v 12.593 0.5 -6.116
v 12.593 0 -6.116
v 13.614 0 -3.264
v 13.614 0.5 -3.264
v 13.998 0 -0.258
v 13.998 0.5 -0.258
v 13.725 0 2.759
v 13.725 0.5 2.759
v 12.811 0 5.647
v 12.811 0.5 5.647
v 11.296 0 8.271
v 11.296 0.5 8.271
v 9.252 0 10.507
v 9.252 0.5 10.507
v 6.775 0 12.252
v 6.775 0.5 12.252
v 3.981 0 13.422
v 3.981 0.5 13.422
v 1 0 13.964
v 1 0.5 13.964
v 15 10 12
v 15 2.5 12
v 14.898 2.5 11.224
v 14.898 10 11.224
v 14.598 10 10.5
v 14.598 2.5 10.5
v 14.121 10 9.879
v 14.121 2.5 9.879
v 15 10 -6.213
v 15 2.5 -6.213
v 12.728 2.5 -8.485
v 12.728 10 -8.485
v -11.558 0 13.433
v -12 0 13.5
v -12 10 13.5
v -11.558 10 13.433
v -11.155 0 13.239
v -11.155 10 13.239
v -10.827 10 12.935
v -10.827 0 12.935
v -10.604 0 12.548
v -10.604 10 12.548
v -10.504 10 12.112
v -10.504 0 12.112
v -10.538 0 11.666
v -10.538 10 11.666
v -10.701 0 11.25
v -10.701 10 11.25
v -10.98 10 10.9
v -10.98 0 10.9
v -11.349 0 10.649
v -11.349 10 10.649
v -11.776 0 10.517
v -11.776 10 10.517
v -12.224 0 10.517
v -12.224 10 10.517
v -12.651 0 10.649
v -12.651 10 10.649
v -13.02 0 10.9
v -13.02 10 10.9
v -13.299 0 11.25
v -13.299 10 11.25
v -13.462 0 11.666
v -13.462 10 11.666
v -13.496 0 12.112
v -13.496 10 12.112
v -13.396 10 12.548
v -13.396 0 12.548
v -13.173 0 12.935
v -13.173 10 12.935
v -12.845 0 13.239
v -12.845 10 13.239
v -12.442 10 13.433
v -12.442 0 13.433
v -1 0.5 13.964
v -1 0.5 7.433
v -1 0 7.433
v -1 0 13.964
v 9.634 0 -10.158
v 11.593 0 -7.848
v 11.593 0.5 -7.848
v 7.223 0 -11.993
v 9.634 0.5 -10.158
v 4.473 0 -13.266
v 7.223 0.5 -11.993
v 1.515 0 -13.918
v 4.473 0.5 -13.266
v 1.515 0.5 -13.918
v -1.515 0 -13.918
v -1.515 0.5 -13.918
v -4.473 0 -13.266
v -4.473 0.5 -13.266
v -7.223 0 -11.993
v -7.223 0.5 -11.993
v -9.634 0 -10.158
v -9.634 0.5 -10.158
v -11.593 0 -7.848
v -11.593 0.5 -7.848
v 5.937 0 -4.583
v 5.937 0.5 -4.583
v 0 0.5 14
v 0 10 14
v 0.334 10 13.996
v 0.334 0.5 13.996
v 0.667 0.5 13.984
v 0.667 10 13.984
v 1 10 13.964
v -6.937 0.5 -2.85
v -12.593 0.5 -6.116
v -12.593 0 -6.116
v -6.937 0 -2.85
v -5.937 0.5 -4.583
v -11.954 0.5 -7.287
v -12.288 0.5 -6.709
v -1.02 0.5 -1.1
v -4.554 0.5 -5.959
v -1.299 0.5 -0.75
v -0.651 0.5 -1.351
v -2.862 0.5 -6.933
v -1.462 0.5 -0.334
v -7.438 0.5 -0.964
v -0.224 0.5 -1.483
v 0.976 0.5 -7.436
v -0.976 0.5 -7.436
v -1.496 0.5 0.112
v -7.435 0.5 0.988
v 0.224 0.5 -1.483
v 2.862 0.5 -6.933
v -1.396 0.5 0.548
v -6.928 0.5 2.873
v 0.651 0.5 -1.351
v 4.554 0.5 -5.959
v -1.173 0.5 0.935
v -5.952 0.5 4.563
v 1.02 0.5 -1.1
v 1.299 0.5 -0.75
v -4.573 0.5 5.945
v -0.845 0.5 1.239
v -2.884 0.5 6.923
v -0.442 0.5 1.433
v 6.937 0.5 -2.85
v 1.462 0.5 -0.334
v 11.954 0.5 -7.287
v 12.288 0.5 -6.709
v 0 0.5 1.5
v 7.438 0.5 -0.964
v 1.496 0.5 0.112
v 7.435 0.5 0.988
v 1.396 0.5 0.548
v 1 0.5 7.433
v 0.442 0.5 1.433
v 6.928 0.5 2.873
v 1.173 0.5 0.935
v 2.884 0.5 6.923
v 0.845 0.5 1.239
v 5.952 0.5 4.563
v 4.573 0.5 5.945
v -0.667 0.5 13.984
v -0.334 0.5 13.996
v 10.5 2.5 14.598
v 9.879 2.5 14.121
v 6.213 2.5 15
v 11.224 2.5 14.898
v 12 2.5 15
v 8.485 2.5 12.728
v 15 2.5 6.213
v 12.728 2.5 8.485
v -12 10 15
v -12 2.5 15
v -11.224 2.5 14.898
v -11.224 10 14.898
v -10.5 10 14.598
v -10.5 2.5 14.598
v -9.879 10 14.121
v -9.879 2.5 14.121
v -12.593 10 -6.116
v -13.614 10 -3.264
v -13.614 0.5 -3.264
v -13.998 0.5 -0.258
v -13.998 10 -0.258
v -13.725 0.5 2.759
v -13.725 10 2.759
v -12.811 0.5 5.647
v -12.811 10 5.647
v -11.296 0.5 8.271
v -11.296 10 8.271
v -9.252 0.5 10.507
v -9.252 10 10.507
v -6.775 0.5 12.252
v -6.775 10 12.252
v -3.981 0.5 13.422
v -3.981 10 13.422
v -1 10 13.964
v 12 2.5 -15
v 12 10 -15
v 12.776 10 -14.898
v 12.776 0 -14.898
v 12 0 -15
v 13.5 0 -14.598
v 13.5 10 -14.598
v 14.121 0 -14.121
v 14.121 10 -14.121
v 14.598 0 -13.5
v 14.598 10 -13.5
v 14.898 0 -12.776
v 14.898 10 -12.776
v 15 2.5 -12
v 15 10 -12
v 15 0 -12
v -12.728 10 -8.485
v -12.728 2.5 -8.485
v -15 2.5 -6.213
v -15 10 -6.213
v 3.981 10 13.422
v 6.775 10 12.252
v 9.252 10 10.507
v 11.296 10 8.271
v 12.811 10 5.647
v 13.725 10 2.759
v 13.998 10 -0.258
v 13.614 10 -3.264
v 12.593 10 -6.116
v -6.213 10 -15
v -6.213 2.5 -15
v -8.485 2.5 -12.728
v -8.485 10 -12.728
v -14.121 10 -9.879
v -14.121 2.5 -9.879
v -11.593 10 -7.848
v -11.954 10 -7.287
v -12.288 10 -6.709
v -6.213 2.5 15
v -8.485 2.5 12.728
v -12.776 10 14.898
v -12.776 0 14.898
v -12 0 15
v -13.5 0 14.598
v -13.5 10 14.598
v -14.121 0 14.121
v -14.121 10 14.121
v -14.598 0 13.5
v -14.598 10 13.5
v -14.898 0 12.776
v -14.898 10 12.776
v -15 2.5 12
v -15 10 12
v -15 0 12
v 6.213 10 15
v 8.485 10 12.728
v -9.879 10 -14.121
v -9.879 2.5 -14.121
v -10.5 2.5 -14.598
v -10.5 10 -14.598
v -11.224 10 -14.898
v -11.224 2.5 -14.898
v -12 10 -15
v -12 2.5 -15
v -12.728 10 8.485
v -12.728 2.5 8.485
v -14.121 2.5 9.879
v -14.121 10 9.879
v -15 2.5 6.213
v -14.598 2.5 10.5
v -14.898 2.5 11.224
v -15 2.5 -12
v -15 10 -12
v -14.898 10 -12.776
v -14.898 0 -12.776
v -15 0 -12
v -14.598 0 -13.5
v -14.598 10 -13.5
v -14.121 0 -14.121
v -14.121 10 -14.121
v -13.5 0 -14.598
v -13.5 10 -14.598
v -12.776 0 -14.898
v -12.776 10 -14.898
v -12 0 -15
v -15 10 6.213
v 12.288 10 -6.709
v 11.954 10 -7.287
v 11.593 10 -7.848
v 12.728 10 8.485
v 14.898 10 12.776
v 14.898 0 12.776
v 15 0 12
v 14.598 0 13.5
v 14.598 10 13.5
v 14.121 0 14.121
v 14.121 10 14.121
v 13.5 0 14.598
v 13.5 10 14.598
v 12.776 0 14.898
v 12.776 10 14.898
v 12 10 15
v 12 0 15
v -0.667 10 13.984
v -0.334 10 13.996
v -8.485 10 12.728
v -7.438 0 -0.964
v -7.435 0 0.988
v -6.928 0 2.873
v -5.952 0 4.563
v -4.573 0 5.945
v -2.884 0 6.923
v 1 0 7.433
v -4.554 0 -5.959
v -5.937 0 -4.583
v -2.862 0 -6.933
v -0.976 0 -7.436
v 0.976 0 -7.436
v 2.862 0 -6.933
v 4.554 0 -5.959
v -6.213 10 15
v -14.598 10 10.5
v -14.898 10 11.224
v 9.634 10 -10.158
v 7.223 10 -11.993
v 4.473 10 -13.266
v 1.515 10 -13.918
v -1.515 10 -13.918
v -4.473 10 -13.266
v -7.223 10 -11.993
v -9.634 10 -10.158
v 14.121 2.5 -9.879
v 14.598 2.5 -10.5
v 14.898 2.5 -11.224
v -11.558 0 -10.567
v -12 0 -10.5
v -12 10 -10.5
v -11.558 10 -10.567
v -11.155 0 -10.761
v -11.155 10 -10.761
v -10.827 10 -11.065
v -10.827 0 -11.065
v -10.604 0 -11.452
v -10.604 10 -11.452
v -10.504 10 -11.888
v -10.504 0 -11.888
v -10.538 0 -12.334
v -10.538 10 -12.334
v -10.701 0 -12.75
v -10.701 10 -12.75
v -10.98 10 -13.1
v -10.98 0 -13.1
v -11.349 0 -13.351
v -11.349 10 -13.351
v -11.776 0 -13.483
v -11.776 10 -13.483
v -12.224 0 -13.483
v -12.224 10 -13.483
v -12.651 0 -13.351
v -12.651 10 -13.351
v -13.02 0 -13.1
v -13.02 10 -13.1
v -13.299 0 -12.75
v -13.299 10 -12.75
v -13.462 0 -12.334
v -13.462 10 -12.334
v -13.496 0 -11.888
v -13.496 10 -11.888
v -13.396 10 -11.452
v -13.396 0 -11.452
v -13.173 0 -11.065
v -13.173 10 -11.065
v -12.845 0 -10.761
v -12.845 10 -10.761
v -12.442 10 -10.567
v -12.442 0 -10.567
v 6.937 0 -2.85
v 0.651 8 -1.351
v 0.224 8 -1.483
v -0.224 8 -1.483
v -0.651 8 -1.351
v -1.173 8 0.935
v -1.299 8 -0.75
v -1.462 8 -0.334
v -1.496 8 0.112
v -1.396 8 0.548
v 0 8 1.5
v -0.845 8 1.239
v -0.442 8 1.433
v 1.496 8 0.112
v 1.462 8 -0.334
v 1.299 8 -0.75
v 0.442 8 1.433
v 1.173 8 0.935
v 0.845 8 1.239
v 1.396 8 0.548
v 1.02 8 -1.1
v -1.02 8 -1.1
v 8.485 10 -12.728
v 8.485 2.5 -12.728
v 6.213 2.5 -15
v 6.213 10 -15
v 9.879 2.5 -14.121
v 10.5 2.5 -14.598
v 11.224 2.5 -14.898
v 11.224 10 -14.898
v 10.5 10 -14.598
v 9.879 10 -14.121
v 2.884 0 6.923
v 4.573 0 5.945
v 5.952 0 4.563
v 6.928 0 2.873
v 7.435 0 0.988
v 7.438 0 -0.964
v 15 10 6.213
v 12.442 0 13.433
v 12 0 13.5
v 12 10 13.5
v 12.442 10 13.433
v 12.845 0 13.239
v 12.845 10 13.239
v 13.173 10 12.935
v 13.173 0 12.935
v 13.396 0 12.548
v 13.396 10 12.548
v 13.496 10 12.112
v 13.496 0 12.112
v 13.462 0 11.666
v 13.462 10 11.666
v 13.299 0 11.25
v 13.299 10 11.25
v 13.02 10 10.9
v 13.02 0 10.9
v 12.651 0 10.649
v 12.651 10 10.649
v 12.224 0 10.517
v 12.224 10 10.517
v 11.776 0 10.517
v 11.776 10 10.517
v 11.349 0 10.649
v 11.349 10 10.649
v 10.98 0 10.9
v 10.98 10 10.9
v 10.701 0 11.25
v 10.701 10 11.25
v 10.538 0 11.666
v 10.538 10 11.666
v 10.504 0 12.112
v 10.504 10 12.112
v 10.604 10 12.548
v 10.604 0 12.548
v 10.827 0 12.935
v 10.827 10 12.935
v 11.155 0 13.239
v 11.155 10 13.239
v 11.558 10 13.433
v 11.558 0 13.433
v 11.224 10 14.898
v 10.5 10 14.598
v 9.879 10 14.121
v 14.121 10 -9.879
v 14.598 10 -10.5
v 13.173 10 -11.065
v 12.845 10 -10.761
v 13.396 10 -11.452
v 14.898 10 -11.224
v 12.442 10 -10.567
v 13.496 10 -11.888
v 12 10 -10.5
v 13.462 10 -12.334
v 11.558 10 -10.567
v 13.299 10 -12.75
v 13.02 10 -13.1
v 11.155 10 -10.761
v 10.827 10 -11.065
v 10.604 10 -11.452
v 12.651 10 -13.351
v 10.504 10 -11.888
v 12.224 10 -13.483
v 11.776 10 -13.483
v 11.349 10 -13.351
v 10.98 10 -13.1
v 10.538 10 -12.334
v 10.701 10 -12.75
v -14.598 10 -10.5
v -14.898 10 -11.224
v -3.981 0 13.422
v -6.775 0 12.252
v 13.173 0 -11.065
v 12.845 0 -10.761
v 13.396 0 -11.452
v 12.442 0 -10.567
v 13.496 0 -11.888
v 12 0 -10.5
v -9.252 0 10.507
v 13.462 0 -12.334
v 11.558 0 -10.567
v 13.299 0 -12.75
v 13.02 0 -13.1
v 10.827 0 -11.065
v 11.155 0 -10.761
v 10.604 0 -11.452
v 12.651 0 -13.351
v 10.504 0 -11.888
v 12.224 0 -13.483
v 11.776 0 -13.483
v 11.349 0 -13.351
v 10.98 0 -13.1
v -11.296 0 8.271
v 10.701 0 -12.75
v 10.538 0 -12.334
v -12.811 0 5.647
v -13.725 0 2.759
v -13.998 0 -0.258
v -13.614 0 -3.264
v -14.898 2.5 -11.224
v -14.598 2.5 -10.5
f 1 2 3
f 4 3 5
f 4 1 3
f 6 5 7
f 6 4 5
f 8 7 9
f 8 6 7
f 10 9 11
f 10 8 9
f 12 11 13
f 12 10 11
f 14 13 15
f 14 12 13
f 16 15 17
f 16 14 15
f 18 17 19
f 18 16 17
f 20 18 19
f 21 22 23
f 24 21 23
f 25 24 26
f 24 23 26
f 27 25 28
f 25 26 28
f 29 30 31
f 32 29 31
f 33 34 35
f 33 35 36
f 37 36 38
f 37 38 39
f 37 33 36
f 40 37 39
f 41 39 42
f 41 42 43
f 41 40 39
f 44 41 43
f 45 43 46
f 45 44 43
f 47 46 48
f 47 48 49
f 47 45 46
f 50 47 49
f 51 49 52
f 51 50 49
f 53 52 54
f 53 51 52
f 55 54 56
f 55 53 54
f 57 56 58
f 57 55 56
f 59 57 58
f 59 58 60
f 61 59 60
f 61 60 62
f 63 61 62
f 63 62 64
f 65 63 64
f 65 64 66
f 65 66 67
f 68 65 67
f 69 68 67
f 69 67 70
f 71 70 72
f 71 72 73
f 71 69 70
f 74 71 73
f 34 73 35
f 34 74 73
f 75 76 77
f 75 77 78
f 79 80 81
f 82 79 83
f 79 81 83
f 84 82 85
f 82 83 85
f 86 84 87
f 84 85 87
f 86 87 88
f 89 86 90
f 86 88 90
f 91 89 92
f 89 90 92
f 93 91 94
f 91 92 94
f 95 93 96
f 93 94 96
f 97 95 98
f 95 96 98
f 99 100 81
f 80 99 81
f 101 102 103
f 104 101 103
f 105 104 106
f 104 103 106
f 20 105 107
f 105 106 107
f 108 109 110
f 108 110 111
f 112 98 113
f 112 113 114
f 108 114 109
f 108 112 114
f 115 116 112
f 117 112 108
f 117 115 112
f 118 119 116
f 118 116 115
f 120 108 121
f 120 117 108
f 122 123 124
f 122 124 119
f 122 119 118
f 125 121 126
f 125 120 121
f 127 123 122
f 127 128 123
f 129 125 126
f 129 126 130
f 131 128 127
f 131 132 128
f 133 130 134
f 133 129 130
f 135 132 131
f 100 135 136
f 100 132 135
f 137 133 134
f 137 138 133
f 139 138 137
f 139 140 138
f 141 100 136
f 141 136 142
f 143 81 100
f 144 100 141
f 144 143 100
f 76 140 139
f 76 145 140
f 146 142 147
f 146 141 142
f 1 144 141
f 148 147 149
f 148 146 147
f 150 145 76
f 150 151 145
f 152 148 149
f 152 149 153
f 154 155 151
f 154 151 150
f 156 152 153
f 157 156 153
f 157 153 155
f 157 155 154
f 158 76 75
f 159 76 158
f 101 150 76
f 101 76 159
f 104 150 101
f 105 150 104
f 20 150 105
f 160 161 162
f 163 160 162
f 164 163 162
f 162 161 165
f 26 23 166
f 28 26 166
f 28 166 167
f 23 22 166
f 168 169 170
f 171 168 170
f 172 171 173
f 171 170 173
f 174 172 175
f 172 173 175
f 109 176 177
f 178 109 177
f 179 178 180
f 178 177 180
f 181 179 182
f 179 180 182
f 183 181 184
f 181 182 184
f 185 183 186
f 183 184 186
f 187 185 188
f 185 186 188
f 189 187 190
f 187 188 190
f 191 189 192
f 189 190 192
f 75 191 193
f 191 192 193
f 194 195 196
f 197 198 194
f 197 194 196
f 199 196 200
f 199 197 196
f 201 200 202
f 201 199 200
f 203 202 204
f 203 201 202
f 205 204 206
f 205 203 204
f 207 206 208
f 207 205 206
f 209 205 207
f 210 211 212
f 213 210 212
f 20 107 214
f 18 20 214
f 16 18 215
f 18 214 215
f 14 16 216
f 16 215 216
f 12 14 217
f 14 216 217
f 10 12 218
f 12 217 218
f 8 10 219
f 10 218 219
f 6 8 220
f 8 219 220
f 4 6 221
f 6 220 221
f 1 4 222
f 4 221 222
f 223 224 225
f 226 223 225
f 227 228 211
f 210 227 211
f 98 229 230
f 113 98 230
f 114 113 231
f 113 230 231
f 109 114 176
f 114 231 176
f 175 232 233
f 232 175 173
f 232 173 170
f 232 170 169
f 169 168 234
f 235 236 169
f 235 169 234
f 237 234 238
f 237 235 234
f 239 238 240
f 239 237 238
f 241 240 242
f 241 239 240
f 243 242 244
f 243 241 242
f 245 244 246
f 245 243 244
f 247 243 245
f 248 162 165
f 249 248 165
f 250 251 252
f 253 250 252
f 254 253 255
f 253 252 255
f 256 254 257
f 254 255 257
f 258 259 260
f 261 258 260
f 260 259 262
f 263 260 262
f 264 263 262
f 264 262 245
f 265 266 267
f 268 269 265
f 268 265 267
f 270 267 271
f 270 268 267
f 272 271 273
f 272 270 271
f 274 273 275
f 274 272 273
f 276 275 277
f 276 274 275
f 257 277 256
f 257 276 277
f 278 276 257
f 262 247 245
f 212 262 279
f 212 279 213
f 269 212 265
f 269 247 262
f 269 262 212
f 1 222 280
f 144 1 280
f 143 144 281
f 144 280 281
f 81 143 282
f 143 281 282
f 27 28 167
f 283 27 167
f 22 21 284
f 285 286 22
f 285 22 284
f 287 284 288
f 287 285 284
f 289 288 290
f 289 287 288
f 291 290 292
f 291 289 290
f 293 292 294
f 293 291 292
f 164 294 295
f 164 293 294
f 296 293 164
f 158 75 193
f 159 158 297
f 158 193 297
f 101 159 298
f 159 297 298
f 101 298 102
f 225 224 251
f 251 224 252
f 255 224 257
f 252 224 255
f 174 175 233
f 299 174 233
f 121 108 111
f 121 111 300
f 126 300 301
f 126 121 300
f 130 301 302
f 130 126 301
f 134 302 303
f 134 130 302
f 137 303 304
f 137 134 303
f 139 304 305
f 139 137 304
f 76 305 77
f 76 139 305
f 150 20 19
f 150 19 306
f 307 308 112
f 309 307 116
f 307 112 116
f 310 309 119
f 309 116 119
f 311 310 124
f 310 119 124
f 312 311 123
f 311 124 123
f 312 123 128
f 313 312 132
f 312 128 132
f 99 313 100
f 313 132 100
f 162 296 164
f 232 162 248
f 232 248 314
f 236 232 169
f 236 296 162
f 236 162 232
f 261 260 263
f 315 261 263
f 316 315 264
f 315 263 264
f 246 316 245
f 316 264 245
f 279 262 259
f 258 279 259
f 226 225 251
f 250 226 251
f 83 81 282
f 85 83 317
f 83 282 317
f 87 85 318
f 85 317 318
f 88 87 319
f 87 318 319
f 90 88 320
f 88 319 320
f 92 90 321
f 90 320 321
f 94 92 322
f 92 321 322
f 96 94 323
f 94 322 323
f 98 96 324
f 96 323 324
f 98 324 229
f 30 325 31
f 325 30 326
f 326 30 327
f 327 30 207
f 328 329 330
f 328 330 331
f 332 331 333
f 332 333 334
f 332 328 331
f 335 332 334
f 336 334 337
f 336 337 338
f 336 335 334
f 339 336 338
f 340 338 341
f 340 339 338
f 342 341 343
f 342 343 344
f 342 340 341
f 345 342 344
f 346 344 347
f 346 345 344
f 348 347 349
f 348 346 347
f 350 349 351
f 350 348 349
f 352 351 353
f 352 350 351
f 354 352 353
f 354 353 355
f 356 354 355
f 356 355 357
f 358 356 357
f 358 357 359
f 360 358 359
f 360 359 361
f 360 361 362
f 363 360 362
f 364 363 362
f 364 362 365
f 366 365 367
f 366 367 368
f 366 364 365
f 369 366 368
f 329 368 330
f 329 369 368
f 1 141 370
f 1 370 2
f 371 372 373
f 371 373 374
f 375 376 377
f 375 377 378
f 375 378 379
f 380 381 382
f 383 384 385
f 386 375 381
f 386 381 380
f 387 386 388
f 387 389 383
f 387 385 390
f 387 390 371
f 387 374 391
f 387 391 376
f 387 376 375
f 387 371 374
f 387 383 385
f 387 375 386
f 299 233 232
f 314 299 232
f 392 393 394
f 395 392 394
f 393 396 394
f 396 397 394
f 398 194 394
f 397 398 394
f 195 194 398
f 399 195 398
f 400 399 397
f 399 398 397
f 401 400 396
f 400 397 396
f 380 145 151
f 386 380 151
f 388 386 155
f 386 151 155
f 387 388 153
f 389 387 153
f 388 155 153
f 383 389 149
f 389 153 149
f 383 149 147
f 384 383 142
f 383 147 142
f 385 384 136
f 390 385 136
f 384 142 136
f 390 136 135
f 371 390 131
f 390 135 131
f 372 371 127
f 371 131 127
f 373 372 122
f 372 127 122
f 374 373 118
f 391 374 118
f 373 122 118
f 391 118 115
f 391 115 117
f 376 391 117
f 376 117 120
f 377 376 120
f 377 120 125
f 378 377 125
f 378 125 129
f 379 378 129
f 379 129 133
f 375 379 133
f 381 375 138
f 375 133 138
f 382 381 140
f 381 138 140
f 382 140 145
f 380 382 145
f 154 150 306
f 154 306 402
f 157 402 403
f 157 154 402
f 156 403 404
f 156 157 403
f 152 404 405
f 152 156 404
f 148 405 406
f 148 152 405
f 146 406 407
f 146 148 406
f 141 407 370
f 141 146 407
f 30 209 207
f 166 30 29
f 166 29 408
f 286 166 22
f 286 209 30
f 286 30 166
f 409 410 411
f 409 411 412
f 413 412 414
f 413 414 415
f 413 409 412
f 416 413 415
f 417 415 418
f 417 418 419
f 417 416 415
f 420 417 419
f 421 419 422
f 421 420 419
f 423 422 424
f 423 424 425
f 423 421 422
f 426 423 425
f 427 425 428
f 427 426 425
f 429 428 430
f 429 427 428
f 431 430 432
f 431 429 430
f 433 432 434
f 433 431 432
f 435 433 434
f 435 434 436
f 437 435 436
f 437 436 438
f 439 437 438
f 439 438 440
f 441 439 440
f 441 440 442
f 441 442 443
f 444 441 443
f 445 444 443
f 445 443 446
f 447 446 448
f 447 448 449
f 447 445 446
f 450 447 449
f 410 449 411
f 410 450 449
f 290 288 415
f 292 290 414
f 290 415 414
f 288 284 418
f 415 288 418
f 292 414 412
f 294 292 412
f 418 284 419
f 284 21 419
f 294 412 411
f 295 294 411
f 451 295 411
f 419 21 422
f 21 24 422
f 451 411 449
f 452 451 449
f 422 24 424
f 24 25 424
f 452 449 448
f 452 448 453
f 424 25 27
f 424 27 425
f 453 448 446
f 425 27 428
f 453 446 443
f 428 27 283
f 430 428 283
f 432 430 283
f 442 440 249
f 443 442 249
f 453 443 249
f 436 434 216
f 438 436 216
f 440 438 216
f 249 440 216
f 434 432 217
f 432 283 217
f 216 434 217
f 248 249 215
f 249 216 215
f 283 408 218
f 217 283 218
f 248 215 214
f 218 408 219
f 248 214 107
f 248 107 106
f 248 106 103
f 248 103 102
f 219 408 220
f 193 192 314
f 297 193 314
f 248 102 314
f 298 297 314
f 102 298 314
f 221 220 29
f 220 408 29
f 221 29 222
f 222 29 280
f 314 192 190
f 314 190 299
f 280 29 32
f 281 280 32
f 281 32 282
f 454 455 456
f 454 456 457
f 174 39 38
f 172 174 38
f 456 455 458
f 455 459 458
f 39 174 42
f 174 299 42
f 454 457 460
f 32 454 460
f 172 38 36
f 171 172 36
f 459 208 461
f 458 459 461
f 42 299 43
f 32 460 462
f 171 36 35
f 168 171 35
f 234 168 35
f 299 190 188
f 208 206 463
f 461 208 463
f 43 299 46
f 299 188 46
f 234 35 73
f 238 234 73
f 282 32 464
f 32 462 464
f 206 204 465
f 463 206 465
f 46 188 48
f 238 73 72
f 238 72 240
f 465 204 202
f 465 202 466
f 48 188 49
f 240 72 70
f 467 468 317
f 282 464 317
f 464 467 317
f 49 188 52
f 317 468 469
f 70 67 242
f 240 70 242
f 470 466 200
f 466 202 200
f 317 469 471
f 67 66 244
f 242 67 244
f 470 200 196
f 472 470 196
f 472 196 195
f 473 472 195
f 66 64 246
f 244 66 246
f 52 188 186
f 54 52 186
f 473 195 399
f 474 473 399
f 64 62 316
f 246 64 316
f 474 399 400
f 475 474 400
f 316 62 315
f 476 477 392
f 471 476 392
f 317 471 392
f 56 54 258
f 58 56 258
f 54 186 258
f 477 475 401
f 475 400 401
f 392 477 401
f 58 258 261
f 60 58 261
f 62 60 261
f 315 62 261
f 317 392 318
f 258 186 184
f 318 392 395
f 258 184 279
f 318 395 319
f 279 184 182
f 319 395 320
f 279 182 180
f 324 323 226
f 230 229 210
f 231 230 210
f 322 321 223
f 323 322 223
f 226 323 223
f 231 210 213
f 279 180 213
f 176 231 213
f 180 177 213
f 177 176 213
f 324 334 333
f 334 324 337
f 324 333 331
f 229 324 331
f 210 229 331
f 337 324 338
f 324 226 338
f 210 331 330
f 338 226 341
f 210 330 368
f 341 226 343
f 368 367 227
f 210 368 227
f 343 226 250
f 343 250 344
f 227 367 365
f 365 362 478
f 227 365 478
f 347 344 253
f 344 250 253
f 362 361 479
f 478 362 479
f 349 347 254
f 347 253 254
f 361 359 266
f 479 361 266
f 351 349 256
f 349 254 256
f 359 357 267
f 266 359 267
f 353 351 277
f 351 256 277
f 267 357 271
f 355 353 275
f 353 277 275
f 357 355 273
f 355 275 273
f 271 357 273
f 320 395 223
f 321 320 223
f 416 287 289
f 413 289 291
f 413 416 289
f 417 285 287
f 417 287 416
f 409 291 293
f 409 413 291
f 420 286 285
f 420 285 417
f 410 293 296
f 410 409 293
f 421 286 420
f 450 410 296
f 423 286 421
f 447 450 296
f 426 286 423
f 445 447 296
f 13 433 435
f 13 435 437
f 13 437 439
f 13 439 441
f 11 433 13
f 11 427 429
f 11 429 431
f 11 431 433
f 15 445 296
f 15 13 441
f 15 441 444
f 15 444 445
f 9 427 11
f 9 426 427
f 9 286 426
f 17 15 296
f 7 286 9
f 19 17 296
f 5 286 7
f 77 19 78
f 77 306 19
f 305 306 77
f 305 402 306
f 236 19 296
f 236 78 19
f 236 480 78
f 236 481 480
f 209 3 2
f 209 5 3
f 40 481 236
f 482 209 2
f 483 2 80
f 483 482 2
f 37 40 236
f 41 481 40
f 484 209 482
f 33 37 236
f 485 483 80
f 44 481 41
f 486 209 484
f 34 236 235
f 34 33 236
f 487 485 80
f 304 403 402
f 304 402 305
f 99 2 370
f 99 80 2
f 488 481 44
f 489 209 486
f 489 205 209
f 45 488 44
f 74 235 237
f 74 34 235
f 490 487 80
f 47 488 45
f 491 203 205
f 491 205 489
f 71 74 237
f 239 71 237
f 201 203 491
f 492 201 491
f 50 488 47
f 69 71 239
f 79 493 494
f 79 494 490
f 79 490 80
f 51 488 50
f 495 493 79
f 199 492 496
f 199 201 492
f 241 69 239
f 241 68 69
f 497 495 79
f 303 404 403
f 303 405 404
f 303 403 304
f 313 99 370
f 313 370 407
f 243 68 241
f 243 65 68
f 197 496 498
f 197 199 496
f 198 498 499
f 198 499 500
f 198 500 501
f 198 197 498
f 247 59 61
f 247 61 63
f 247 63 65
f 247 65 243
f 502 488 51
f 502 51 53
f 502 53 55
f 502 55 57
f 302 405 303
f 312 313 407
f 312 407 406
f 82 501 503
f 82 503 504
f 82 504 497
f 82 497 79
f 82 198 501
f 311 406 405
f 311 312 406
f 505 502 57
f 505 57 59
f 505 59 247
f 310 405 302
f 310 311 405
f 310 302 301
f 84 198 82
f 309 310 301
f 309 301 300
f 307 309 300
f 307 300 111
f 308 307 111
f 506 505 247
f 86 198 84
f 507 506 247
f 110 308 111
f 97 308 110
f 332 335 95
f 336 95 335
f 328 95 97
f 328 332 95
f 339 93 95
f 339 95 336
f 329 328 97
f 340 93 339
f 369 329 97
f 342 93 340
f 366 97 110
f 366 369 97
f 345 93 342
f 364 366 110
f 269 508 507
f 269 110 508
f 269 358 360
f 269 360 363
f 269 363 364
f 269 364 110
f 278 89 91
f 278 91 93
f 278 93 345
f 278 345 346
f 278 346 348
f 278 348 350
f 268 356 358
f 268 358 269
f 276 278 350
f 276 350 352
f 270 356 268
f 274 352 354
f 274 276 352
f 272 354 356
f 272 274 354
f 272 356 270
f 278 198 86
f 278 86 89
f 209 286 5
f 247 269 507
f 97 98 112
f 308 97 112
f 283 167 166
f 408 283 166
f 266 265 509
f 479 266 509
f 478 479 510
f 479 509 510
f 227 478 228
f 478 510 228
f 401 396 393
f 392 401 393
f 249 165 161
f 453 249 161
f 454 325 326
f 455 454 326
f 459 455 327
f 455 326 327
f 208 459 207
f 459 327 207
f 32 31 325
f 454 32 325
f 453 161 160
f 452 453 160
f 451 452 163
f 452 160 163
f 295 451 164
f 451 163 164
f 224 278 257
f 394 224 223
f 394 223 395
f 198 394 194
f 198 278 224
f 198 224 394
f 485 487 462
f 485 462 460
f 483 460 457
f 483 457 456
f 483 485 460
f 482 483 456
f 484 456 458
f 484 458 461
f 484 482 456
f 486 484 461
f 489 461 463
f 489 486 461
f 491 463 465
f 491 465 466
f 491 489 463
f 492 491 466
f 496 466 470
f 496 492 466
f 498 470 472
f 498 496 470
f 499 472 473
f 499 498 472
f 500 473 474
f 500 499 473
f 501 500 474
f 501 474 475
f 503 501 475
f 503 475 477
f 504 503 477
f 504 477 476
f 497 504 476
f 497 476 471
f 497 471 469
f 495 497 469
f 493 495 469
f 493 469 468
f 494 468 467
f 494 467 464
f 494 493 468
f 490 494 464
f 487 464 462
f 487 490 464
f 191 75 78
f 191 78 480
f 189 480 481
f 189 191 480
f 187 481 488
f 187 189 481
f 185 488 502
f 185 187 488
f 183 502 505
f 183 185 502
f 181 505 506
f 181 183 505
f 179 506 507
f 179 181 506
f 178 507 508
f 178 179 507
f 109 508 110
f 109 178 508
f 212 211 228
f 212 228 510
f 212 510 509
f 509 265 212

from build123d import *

# Parameters (mm, degrees)
SKETCH1_R           = 1.5
BOSS_EXTRUDE1_DEPTH = 10
SKETCH2_R           = 14
CUT_EXTRUDE1_DEPTH  = 9.5
CUT_EXTRUDE2_START  = -10
CUT_EXTRUDE2_DEPTH  = 10
SKETCH4_R           = 1.5
BOSS_EXTRUDE2_DEPTH = 7.5
CUT_EXTRUDE3_START  = -7.5
CUT_EXTRUDE3_DEPTH  = 7.5


with BuildPart() as part:
    # Sketch1 → Boss-Extrude1 (new body)
    with BuildSketch(Plane(origin=(0, 0, 0), x_dir=(1, 0, 0), z_dir=(0, 1, 0))):
        with BuildLine():
            Line((-12, 15), (12, 15))
            ThreePointArc((12, 15), (14.121320344, 14.121320344), (15, 12))
            Line((15, 12), (15, -12))
            ThreePointArc((15, -12), (14.121320344, -14.121320344), (12, -15))
            Line((12, -15), (-12, -15))
            ThreePointArc((-12, -15), (-14.121320344, -14.121320344), (-15, -12))
            Line((-15, -12), (-15, 12))
            ThreePointArc((-15, 12), (-14.121320344, 14.121320344), (-12, 15))
        make_face()
        with Locations(Location((-12, -12, 0), (0, 0, 270))):
            Circle(SKETCH1_R, mode=Mode.SUBTRACT)
        with Locations(Location((-12, 12, 0), (0, 0, 270))):
            Circle(SKETCH1_R, mode=Mode.SUBTRACT)
        with Locations(Location((12, 12, 0), (0, 0, 270))):
            Circle(SKETCH1_R, mode=Mode.SUBTRACT)
        with Locations(Location((12, -12, 0), (0, 0, 270))):
            Circle(SKETCH1_R, mode=Mode.SUBTRACT)
    extrude(amount=BOSS_EXTRUDE1_DEPTH)

    # Sketch2 → Cut-Extrude1 (cut)
    with BuildSketch(Plane(origin=(0, 10, 0), x_dir=(1, 0, 0), z_dir=(0, 1, 0))):
        with Locations(Location((0, 0, 0), (0, 0, 270))):
            Circle(SKETCH2_R)
    extrude(amount=-CUT_EXTRUDE1_DEPTH, mode=Mode.SUBTRACT)

    # Sketch3 → Cut-Extrude2 (cut)
    with BuildSketch(Plane.XZ.offset(CUT_EXTRUDE2_START)):
        with BuildLine():
            Line((6.937196595, -2.850491783), (12.593386622, -6.116094618))
            ThreePointArc((12.593386622, -6.116094618), (12.124355653, 7), (1, 13.964240044))
            Line((1, 13.964240044), (1, 7.433034374))
            ThreePointArc((1, 7.433034374), (6.495190528, 3.75), (6.937196595, -2.850491783))
        make_face()
        with BuildLine():
            Line((5.937196595, -4.582542591), (11.593386622, -7.848145426))
            ThreePointArc((11.593386622, -7.848145426), (0, -14), (-11.593386622, -7.848145426))
            Line((-11.593386622, -7.848145426), (-5.937196595, -4.582542591))
            ThreePointArc((-5.937196595, -4.582542591), (0, -7.5), (5.937196595, -4.582542591))
        make_face()
        with BuildLine():
            Line((-1, 7.433034374), (-1, 13.964240044))
            ThreePointArc((-1, 13.964240044), (-12.124355653, 7), (-12.593386622, -6.116094618))
            Line((-12.593386622, -6.116094618), (-6.937196595, -2.850491783))
            ThreePointArc((-6.937196595, -2.850491783), (-6.495190528, 3.75), (-1, 7.433034374))
        make_face()
    extrude(amount=CUT_EXTRUDE2_DEPTH, mode=Mode.SUBTRACT)

    # Sketch4 → Boss-Extrude2 (add)
    with BuildSketch(Plane(origin=(0, 0.5, 0), x_dir=(1, 0, 0), z_dir=(0, 1, 0))):
        with Locations(Location((0, 0, 0), (0, 0, 270))):
            Circle(SKETCH4_R)
    extrude(amount=BOSS_EXTRUDE2_DEPTH)

    # Sketch5 → Cut-Extrude3 (cut)
    with BuildSketch(Plane(origin=(0, 10, 0), x_dir=(1, 0, 0), z_dir=(0, 1, 0)).offset(CUT_EXTRUDE3_START)):
        with BuildLine():
            Line((-6.213203436, 15), (-8.485281374, 12.727922061))
            Line((-8.485281374, 12.727922061), (-9.878679656, 14.121320344))
            ThreePointArc((-9.878679656, 14.121320344), (-10.851949703, 14.771638598), (-12, 15))
            Line((-12, 15), (-6.213203436, 15))
        make_face()
        with BuildLine():
            Line((-14.121320344, 9.878679656), (-12.727922061, 8.485281374))
            Line((-12.727922061, 8.485281374), (-15, 6.213203436))
            Line((-15, 6.213203436), (-15, 12))
            ThreePointArc((-15, 12), (-14.771638598, 10.851949703), (-14.121320344, 9.878679656))
        make_face()
        with BuildLine():
            Line((15, 6.213203436), (12.727922061, 8.485281374))
            Line((12.727922061, 8.485281374), (14.121320344, 9.878679656))
            ThreePointArc((14.121320344, 9.878679656), (14.771638598, 10.851949703), (15, 12))
            Line((15, 12), (15, 6.213203436))
        make_face()
        with BuildLine():
            Line((9.878679656, 14.121320344), (8.485281374, 12.727922061))
            Line((8.485281374, 12.727922061), (6.213203436, 15))
            Line((6.213203436, 15), (12, 15))
            ThreePointArc((12, 15), (10.851949703, 14.771638598), (9.878679656, 14.121320344))
        make_face()
        with BuildLine():
            Line((6.213203436, -15), (8.485281374, -12.727922061))
            Line((8.485281374, -12.727922061), (9.878679656, -14.121320344))
            ThreePointArc((9.878679656, -14.121320344), (10.851949703, -14.771638598), (12, -15))
            Line((12, -15), (6.213203436, -15))
        make_face()
        with BuildLine():
            Line((14.121320344, -9.878679656), (12.727922061, -8.485281374))
            Line((12.727922061, -8.485281374), (15, -6.213203436))
            Line((15, -6.213203436), (15, -12))
            ThreePointArc((15, -12), (14.771638598, -10.851949703), (14.121320344, -9.878679656))
        make_face()
        with BuildLine():
            Line((-15, -6.213203436), (-12.727922061, -8.485281374))
            Line((-12.727922061, -8.485281374), (-14.121320344, -9.878679656))
            ThreePointArc((-14.121320344, -9.878679656), (-14.771638598, -10.851949703), (-15, -12))
            Line((-15, -12), (-15, -6.213203436))
        make_face()
        with BuildLine():
            Line((-9.878679656, -14.121320344), (-8.485281374, -12.727922061))
            Line((-8.485281374, -12.727922061), (-6.213203436, -15))
            Line((-6.213203436, -15), (-12, -15))
            ThreePointArc((-12, -15), (-10.851949703, -14.771638598), (-9.878679656, -14.121320344))
        make_face()
    extrude(amount=CUT_EXTRUDE3_DEPTH, mode=Mode.SUBTRACT)


solid = part.part
